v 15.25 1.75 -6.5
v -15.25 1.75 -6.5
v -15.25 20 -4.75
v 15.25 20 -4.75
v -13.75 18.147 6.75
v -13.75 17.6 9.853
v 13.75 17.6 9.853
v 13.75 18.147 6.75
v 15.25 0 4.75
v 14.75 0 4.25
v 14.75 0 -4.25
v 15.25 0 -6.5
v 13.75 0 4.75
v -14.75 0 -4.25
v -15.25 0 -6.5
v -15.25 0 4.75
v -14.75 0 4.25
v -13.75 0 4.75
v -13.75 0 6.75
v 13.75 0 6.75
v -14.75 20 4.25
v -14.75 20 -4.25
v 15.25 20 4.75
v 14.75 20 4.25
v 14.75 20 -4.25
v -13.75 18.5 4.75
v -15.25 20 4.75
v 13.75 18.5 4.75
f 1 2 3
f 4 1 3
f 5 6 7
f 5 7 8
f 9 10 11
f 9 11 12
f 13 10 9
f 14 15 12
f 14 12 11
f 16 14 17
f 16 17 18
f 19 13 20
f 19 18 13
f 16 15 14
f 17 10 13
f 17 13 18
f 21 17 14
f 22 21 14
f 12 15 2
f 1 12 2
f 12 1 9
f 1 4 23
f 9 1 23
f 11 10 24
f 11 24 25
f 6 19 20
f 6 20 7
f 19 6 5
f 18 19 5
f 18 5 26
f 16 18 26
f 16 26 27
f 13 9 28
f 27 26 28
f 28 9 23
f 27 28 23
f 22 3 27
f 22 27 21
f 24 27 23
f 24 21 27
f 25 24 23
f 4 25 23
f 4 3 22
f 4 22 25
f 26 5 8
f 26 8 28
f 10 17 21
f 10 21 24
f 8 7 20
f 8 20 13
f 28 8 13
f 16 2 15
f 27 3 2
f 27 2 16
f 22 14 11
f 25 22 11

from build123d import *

# Parameters (mm, degrees)
SKETCH1_W           = 30.5
SKETCH1_H           = 9.5
SKETCH1_W_2         = 29.5
SKETCH1_H_2         = 8.5
BOSS_EXTRUDE1_DEPTH = 20
BOSS_EXTRUDE2_DEPTH = 30.5
CUT_EXTRUDE1_DEPTH  = 1.5


with BuildPart() as part:
    # Sketch1 → Boss-Extrude1 (new body)
    with BuildSketch(Plane(origin=(0, 0, 0), x_dir=(1, 0, 0), z_dir=(0, 1, 0))):
        Rectangle(SKETCH1_W, SKETCH1_H)
        Rectangle(SKETCH1_W_2, SKETCH1_H_2, mode=Mode.SUBTRACT)
    extrude(amount=BOSS_EXTRUDE1_DEPTH)

    # Sketch2 → Boss-Extrude2 (add)
    with BuildSketch(Plane.ZY.offset(15.25)):
        Polygon((6.75, 18.147346039), (6.75, 0), (9.853378947, 17.600136599), align=None)
        Polygon((4.75, 18.5), (4.75, 0), (6.75, 0), (6.75, 18.147346039), align=None)
        Polygon((-6.5, 1.75), (-4.75, 20), (-4.75, 0), (-6.5, 0), align=None)
    extrude(amount=-BOSS_EXTRUDE2_DEPTH)

    # Sketch3 → Cut-Extrude1 (cut)
    with BuildSketch(Plane.ZY.offset(15.25)):
        Polygon((4.75, 18.5), (9.853378947, 17.600136599), (6.75, 0), (4.75, 0), align=None)
    cut_extrude1 = extrude(amount=-CUT_EXTRUDE1_DEPTH, mode=Mode.SUBTRACT)

    # Mirror1: Cut-Extrude1 across plane
    add(cut_extrude1.mirror(Plane.ZY), mode=Mode.SUBTRACT)


solid = part.part
